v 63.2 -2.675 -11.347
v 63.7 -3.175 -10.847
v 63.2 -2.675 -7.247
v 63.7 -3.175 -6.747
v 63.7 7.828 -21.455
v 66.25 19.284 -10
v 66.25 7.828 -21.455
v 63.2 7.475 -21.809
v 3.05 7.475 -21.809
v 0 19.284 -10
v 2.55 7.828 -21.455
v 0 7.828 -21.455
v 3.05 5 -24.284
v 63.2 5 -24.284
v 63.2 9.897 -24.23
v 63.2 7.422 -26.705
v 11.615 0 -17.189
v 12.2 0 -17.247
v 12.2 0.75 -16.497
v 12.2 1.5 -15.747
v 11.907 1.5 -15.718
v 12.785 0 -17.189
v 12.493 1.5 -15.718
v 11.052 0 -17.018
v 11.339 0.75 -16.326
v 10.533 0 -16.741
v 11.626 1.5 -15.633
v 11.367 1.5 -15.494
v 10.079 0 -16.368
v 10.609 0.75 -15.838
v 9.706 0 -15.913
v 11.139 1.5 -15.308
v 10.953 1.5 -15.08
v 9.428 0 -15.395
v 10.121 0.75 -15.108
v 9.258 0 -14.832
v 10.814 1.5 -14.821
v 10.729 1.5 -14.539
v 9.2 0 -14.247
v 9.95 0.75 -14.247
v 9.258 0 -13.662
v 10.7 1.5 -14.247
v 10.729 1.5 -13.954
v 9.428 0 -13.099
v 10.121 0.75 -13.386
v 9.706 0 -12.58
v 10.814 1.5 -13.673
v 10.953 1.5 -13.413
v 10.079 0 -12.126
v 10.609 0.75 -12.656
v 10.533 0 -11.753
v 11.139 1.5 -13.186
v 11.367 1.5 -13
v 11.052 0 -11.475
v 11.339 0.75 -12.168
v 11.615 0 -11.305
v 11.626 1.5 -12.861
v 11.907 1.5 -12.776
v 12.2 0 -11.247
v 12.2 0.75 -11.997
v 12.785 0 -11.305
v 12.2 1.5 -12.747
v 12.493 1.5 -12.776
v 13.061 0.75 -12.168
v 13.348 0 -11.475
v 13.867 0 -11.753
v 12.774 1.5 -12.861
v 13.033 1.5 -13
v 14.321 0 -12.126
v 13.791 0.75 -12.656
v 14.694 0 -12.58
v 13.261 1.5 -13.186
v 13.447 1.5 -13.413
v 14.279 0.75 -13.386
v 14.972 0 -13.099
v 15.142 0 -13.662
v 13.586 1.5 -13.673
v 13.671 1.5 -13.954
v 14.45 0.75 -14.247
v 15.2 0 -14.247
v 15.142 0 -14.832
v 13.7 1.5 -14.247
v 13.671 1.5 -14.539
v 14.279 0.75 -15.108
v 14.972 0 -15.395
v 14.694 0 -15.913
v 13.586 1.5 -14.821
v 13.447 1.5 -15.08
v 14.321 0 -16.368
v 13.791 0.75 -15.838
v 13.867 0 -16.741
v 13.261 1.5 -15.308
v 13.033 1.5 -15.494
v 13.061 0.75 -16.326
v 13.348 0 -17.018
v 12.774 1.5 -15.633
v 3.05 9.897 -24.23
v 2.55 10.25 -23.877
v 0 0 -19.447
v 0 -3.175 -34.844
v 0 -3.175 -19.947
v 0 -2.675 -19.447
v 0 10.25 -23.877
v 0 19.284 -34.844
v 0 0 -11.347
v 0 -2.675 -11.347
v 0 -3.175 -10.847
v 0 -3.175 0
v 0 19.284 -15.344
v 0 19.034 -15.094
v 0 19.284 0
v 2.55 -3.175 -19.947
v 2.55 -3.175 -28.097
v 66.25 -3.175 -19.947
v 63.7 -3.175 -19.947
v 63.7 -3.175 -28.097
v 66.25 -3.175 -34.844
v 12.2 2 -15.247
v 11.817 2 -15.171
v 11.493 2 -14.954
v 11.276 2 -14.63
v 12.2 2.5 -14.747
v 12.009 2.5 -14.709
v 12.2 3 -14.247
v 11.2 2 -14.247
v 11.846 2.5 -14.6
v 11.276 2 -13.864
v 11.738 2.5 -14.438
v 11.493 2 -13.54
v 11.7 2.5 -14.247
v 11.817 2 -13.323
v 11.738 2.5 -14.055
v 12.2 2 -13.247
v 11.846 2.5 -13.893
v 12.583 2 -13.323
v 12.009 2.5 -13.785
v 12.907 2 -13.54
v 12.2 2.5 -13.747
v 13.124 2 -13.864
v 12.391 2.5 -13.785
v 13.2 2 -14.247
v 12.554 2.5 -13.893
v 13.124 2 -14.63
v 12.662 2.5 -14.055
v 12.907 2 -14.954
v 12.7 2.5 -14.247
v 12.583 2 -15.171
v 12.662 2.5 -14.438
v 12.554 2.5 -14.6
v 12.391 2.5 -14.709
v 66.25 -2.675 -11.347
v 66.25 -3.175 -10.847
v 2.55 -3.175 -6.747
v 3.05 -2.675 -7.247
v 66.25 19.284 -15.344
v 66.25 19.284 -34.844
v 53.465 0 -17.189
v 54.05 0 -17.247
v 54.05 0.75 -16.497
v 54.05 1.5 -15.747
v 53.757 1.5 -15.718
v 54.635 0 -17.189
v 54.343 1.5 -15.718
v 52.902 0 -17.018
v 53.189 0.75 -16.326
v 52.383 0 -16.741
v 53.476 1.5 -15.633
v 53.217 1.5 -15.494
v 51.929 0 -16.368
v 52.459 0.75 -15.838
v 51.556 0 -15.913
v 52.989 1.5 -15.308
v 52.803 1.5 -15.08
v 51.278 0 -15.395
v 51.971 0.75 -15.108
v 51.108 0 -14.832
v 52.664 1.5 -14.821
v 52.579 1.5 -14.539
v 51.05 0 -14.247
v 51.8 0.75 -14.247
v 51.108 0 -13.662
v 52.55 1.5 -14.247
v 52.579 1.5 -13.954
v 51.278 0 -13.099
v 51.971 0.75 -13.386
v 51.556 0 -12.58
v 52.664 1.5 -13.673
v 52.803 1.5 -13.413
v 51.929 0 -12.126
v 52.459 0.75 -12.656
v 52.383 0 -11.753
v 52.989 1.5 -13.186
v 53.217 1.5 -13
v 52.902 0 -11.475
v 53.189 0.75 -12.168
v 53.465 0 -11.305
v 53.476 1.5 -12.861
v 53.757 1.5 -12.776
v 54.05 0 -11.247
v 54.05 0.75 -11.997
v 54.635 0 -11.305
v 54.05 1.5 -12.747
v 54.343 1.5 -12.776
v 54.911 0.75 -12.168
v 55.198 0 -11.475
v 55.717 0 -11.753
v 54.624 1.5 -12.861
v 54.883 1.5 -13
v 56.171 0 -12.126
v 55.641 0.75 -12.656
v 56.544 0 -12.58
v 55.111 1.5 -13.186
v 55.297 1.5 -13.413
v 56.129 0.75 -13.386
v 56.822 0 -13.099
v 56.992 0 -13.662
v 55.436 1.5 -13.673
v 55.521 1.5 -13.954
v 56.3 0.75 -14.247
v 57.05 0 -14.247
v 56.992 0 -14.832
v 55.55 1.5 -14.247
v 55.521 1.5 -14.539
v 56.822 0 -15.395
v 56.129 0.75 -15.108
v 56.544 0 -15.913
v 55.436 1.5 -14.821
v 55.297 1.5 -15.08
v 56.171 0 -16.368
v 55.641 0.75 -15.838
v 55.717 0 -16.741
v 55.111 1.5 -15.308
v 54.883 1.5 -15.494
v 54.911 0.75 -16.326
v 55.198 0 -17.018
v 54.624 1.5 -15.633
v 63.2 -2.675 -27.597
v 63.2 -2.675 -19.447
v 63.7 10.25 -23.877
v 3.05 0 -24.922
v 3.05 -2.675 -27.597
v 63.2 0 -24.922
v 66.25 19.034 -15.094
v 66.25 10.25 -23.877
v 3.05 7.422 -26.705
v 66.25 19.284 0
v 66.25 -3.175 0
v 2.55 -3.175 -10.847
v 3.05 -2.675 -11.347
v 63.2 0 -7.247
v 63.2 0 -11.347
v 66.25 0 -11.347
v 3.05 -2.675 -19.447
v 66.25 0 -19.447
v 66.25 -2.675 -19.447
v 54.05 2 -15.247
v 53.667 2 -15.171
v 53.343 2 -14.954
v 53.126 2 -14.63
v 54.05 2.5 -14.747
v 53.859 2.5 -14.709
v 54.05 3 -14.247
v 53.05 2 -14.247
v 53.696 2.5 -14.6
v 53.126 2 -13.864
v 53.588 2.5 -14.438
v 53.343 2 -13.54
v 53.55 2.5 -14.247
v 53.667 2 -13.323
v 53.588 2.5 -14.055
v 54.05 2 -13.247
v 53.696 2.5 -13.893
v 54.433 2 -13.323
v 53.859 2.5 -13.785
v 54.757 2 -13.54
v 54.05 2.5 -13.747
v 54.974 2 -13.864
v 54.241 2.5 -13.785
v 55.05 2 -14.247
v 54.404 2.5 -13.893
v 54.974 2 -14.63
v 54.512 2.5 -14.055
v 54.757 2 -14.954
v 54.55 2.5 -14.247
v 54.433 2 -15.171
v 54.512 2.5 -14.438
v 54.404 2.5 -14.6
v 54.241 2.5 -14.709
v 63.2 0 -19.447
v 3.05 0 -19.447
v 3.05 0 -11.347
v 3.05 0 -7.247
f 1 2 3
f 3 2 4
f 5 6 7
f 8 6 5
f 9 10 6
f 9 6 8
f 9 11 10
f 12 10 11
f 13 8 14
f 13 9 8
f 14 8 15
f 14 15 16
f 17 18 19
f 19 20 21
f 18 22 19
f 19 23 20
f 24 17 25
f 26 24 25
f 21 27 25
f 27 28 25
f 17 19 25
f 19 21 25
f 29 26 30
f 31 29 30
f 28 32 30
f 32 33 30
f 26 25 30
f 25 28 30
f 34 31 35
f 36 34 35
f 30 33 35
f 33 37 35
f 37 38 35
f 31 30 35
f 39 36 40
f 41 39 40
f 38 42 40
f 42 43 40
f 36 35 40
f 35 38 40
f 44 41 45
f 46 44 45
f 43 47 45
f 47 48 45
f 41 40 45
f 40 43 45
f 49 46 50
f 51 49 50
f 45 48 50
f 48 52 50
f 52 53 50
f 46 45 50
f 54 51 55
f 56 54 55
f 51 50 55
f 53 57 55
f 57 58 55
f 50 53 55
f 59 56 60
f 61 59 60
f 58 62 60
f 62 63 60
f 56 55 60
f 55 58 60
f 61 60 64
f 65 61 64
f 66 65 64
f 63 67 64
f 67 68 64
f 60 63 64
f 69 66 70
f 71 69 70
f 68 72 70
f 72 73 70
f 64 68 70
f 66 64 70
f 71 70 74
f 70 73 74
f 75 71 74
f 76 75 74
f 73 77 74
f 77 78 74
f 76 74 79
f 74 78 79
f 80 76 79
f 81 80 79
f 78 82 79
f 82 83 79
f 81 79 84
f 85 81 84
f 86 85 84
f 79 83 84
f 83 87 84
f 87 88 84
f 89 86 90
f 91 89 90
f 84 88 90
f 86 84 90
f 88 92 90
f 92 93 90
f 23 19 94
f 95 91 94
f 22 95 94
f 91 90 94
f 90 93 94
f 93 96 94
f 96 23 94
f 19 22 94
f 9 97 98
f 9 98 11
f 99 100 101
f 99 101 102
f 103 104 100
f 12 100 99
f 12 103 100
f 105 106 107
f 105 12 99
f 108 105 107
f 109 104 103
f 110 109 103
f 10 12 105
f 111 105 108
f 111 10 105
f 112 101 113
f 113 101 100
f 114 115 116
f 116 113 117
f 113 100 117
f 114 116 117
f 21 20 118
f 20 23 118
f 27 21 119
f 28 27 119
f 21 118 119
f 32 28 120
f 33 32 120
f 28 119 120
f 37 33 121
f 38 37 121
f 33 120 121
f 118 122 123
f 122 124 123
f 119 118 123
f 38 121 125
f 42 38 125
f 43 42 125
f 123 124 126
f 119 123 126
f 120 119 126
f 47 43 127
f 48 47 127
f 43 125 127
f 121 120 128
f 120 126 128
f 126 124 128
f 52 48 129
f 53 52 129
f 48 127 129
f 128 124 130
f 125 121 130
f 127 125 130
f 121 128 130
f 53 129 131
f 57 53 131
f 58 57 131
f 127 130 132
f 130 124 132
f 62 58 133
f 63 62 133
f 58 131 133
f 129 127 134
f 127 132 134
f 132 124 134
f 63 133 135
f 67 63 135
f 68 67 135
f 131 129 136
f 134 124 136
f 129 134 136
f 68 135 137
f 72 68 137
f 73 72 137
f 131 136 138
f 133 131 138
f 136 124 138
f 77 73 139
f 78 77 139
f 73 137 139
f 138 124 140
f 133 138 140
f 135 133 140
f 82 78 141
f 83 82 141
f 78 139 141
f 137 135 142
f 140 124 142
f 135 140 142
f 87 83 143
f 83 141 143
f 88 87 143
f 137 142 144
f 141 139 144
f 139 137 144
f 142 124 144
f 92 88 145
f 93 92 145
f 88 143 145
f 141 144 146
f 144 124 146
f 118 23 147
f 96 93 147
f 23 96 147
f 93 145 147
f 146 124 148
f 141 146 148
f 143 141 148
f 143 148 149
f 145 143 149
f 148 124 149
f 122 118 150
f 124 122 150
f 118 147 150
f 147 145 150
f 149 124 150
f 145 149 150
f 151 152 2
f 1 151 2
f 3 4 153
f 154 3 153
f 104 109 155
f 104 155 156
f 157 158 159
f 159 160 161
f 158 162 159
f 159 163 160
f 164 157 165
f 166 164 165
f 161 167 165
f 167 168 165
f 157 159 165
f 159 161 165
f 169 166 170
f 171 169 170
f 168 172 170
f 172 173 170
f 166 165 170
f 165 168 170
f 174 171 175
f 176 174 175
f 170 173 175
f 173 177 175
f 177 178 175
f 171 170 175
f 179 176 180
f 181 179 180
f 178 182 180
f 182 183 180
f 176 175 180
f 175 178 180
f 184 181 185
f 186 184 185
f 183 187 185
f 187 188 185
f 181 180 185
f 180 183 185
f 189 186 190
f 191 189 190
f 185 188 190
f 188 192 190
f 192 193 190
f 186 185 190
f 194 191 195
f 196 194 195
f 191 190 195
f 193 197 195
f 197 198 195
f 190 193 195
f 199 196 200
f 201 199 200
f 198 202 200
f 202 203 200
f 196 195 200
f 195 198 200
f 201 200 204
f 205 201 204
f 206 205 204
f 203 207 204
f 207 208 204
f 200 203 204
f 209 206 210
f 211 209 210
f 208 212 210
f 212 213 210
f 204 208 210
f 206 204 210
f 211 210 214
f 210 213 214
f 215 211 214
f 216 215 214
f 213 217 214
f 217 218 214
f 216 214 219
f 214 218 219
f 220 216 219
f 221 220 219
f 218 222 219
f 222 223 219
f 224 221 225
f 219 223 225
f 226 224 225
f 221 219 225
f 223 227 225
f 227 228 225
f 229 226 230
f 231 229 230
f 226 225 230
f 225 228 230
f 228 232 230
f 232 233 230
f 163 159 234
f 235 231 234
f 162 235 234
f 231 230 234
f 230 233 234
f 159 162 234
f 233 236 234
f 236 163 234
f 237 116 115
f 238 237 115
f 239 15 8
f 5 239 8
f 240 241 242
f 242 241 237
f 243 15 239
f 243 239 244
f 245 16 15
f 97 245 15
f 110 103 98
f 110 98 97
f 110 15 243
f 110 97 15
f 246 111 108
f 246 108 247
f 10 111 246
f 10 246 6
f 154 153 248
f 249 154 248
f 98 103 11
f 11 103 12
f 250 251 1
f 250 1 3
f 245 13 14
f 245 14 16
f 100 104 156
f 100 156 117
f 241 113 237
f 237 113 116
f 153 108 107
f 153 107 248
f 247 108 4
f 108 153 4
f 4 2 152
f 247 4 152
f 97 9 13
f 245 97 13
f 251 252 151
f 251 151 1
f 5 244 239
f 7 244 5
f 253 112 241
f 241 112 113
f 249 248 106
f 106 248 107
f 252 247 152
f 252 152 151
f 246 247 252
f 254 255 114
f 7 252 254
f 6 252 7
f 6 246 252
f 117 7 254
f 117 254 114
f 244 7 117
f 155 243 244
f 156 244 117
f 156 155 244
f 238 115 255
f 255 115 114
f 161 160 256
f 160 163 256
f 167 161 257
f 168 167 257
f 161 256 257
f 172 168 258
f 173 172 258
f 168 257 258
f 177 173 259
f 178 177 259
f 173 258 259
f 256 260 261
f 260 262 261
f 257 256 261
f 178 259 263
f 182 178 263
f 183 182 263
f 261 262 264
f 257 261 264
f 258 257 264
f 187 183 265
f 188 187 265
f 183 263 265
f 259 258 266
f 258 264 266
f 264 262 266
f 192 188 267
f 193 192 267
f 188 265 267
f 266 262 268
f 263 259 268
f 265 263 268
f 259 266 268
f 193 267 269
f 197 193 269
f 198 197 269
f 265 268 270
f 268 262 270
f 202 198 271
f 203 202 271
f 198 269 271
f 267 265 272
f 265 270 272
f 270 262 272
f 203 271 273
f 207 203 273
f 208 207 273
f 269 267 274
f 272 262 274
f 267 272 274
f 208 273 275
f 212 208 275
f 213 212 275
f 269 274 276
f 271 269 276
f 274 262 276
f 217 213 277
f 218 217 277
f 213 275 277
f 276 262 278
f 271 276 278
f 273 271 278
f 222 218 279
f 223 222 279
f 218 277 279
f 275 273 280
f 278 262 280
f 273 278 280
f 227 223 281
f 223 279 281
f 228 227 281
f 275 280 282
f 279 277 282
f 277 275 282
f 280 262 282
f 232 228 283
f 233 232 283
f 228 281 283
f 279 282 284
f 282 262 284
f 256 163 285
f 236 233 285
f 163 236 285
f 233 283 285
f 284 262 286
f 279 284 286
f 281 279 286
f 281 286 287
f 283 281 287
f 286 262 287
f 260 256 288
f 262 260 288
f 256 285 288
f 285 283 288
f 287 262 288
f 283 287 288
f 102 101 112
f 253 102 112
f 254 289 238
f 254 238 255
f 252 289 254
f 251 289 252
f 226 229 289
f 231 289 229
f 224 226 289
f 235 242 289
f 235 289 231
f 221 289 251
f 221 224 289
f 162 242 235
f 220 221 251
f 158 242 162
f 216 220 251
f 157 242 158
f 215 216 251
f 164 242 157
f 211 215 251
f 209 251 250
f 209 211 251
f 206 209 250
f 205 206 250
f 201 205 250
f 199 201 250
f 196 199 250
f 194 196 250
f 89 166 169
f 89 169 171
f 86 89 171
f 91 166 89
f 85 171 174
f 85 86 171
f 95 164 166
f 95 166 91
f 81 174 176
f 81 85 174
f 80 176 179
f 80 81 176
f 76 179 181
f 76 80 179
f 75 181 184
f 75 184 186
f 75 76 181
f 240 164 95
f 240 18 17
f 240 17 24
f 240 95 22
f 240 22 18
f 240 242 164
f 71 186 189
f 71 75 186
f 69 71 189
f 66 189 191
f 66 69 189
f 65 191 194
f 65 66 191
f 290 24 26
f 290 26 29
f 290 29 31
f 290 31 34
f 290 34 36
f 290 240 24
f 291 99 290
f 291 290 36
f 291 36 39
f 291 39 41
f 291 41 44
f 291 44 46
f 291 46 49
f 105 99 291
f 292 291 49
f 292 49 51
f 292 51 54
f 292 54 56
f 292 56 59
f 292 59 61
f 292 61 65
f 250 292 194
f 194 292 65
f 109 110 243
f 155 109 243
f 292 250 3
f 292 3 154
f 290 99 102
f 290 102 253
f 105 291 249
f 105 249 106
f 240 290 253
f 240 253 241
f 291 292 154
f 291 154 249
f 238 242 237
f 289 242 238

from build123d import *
from OCP.BRepFilletAPI import BRepFilletAPI_MakeChamfer

# Parameters (mm, degrees)
BOSS_EXTRUDE1_DEPTH = 66.25
BOSS_EXTRUDE2_DEPTH = 3.05
BOSS_EXTRUDE3_DEPTH = 3.175
SKETCH2_4_R         = 1.5
CUT_EXTRUDE1_DEPTH  = 3
CHAMFER1_SIZE       = 1.5
CHAMFER3_SIZE       = 2.675
CHAMFER4_SIZE       = 0.5
CHAMFER4_SIZE_2     = 0.353553391


with BuildPart() as part:
    # Sketch1 → Boss-Extrude1 (new body)
    with BuildSketch(Plane(origin=(0, 0, 0), x_dir=(0, 0, -1), z_dir=(1, 0, 0))):
        Polygon((14.843681451, 19.28355698), (34.843681451, 19.28355698), (34.843681451, 0), (0, 0), (0, 19.28355698), (10, 19.28355698), (24.28355698, 5), (26.705397706, 7.421840726), align=None)
    extrude(amount=BOSS_EXTRUDE1_DEPTH)

    # Sketch1<4> → Boss-Extrude2 (add)
    with BuildSketch(Plane(origin=(0, 0, 0), x_dir=(0, 0, -1), z_dir=(1, 0, 0))):
        Polygon((23.876970581, 10.25026785), (21.455129855, 7.828427125), (24.28355698, 5), (26.705397706, 7.421840726), align=None)
    boss_extrude2 = extrude(amount=BOSS_EXTRUDE2_DEPTH)

    # Mirror1: Boss-Extrude2 across plane
    add(boss_extrude2.mirror(Plane.ZY.offset(-33.125)))

    # Sketch2 → Boss-Extrude3 (add)
    with BuildSketch(Plane(origin=(0, 0, 0), x_dir=(1, 0, 0), z_dir=(0, 1, 0))):
        Polygon((0, 11.346840726), (0, 0), (66.25, 0), (66.25, 11.346840726), (63.2, 11.346840726), (63.2, 7.246840726), (3.05, 7.246840726), (3.05, 11.346840726), align=None)
        Polygon((0, 34.843681451), (0, 19.446840726), (3.05, 19.446840726), (3.05, 27.596840726), (63.2, 27.596840726), (63.2, 19.446840726), (66.25, 19.446840726), (66.25, 34.843681451), align=None)
    extrude(amount=-BOSS_EXTRUDE3_DEPTH)

    # Sketch2<4> → Cut-Extrude1 (cut)
    with BuildSketch(Plane(origin=(0, 0, 0), x_dir=(1, 0, 0), z_dir=(0, 1, 0))):
        with Locations(Location((54.05, 14.246840726, 0), (0, 0, 90))):
            Circle(SKETCH2_4_R)
        with Locations(Location((12.2, 14.246840726, 0), (0, 0, 90))):
            Circle(SKETCH2_4_R)
    extrude(amount=CUT_EXTRUDE1_DEPTH, mode=Mode.SUBTRACT)

    # Chamfer1
    chamfer1_edges = [part.edges().sort_by_distance(p)[0] for p in [
        (54.05, 3, -12.746840726),
        (54.05, 0, -12.746840726),
        (12.2, 0, -12.746840726),
        (12.2, 3, -12.746840726),
    ]]
    chamfer(chamfer1_edges, length=CHAMFER1_SIZE - 0.0001)  # a hair under: the kernel refuses the full size

    # Chamfer3
    chamfer3_edges = [part.edges().sort_by_distance(p)[0] for p in [
        (33.125, 0, -27.596840726),
    ]]
    chamfer(chamfer3_edges, length=CHAMFER3_SIZE)

    # Chamfer4
    chamfer4_edges_1 = [part.edges().sort_by_distance(p)[0] for p in [
        (3.05, 9.039347488, -22.666050218),
        (63.2, 9.039347488, -22.666050218),
        (3.05, -3.175, -23.521840726),
        (1.525, -3.175, -19.446840726),
        (63.2, -3.175, -23.521840726),
        (64.725, -3.175, -19.446840726),
        (1.525, -3.175, -11.346840726),
        (3.05, -3.175, -9.296840726),
        (33.125, -3.175, -7.246840726),
        (63.2, -3.175, -9.296840726),
        (64.725, -3.175, -11.346840726),
        (33.125, -3.175, -27.596840726),
    ]]
    chamfer4_edges_2 = [part.edges().sort_by_distance(p)[0] for p in [
        (33.125, 19.28355698, -14.843681451),
    ]]
    chamfer4_side_2 = [part.faces().sort_by_distance(p)[0] for p in [
        (33.125, 19.28355698, -14.850752519),
    ]]
    chamfer4 = BRepFilletAPI_MakeChamfer(part.part.solid().wrapped)
    for e in chamfer4_edges_1:
        chamfer4.Add(CHAMFER4_SIZE - 0.0001, e.wrapped)
    for e in chamfer4_edges_2:
        chamfer4.Add(CHAMFER4_SIZE - 0.0001, CHAMFER4_SIZE_2 - 0.0001, e.wrapped, chamfer4_side_2[0].wrapped)
    add(Compound.cast(chamfer4.Shape()), mode=Mode.REPLACE)  # a hair under: the kernel refuses the full size


solid = part.part
